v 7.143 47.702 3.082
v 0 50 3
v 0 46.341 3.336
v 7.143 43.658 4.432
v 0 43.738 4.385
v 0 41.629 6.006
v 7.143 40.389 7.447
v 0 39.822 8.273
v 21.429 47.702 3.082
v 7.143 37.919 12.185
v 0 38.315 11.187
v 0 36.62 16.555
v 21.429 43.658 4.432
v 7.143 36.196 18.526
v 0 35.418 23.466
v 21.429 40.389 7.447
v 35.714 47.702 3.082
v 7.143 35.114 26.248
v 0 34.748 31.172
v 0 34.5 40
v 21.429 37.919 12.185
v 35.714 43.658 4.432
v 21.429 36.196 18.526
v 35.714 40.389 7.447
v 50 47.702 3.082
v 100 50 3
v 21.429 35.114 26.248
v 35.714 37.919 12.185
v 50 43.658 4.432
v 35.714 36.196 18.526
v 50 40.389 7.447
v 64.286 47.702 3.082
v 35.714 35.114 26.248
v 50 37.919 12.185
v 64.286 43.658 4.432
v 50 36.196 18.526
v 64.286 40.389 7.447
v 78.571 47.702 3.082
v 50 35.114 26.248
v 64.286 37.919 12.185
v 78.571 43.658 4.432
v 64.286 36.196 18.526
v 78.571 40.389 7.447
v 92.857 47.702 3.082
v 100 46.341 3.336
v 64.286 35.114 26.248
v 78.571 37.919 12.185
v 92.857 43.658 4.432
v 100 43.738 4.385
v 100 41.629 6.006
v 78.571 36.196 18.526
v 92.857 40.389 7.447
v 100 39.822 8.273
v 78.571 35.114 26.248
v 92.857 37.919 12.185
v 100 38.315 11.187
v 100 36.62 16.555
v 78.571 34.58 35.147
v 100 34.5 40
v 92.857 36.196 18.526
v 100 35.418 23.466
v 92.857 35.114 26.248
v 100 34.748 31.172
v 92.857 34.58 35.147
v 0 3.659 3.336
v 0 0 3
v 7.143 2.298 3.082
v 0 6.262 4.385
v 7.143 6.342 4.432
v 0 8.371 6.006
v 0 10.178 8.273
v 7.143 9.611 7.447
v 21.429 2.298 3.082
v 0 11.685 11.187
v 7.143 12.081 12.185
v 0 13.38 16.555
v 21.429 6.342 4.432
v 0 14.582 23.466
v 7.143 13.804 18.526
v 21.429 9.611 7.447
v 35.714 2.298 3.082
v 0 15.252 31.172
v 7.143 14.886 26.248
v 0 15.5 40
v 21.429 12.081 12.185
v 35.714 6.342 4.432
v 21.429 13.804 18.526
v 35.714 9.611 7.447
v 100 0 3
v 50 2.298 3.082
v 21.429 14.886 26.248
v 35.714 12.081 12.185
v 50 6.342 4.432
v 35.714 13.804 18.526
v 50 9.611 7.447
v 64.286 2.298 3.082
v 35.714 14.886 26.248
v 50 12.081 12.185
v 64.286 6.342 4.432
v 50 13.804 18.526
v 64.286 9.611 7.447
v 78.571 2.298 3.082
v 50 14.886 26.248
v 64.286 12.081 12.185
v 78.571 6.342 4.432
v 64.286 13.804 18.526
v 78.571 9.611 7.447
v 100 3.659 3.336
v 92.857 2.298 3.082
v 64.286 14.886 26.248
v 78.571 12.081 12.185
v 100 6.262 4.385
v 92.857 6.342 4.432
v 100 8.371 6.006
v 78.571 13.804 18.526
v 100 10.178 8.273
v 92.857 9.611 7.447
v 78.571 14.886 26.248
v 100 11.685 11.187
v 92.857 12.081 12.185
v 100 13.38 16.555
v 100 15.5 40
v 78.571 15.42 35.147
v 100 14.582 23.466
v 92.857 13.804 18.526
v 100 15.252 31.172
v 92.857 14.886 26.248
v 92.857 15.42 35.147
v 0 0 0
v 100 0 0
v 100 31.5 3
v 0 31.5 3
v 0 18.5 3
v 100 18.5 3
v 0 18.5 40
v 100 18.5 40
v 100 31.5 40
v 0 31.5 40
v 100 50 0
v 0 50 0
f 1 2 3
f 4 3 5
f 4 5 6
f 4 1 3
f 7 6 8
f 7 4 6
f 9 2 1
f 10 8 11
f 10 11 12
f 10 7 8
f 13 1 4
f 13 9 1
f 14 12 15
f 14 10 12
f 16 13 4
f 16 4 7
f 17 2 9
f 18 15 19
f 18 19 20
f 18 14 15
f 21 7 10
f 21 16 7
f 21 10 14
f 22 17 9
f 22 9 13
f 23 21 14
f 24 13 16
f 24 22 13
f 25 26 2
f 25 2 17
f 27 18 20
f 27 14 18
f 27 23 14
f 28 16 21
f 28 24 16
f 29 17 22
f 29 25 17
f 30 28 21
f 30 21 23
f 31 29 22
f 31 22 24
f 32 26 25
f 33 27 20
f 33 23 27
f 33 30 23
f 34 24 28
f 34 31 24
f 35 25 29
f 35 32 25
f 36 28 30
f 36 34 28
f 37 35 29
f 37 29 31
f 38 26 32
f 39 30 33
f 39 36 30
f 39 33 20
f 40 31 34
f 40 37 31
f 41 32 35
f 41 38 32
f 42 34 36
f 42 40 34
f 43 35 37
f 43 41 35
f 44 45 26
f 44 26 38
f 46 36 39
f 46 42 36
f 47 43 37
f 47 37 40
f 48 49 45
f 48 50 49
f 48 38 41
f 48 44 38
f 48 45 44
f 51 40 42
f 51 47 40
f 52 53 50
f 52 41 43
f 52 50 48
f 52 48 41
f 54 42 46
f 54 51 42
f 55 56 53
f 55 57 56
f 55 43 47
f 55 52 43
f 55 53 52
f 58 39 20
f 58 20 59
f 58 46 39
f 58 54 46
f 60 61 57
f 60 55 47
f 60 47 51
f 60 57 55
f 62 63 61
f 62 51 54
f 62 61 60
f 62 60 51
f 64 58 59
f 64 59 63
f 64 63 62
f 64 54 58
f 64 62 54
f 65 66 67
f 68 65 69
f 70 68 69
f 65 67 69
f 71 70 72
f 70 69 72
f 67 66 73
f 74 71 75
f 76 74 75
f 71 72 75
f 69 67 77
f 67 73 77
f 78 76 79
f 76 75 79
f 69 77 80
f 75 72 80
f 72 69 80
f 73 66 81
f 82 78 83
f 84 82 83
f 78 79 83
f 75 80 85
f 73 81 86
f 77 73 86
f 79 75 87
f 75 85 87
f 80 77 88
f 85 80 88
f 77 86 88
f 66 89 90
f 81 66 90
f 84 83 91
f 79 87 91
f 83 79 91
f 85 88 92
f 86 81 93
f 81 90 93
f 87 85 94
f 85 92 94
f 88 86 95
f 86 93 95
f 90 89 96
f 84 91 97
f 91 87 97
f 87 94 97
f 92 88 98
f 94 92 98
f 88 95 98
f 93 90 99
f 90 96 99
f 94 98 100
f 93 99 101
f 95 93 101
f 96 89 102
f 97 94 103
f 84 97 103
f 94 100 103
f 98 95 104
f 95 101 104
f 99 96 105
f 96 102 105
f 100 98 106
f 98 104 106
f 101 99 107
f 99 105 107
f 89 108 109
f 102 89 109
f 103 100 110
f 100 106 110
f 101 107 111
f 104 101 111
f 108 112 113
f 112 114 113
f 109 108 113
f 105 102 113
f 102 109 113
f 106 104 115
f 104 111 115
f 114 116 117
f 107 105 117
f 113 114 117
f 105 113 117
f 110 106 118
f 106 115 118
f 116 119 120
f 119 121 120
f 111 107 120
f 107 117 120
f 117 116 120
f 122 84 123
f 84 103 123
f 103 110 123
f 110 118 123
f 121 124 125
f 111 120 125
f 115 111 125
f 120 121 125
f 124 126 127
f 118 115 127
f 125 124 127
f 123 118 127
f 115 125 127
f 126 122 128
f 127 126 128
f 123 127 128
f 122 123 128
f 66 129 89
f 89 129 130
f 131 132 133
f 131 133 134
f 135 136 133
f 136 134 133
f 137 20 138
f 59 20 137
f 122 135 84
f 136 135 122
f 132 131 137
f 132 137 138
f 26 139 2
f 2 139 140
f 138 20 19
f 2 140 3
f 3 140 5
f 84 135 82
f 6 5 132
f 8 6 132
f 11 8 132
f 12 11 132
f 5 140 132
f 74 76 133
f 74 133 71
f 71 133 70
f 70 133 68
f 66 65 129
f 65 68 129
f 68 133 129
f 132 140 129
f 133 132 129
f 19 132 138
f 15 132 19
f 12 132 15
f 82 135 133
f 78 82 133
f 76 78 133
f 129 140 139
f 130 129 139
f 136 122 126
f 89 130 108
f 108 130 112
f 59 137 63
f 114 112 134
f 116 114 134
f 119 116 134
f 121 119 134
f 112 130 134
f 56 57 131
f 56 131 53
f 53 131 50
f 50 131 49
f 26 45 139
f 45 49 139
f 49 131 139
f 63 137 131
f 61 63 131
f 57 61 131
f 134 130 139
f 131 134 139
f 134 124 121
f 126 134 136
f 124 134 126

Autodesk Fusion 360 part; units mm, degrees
sketch "Sketch1" plane through (0, 0, 0) normal (0, 0, 1) x (1, 0, 0)
  line L0 (0, 0) -> (100, 0)
  line L1 (100, 0) -> (100, 50)
  line L2 (100, 50) -> (0, 50)
  line L3 (0, 50) -> (0, 0)
  line L4 (0, 0) -> (100, 0)
  line L5 (100, 0) -> (100, 18.5)
  line L6 (100, 18.5) -> (0, 18.5)
  line L7 (0, 18.5) -> (0, 0)
  line L8 (0, 50) -> (100, 50)
  line L9 (100, 50) -> (100, 31.5)
  line L10 (100, 31.5) -> (0, 31.5)
  line L11 (0, 31.5) -> (0, 50)
  dimension "d1" = 100
  dimension "d2" = 50
  dimension "d3" = 18.5
  dimension "d4" = 18.5
extrude "Extrude1" add sketch "Sketch1" along normal blind 3 contours L1 L3 L6 L10
extrude "Extrude2" add sketch "Sketch1" along normal blind 40 contours L0 L1 L3 L4 L5 L6 L7 | L1 L2 L3 L8 L9 L10 L11
sketch "Sketch2" plane through (100, 0, 0) normal (1, 0, 0) x (0, 1, 0)
  line L0 (0, 0) -> (50, 0)
  line L1 (50, 0) -> (50, 40)
  line L2 (50, 40) -> (31.5, 40)
  line L3 (31.5, 40) -> (31.5, 3)
  line L4 (31.5, 3) -> (18.5, 3)
  line L5 (18.5, 3) -> (18.5, 40)
  line L6 (18.5, 40) -> (0, 40)
  line L7 (0, 40) -> (0, 0)
  line L8 (18.5, 40) -> (15.5, 40)
  line L9 (31.5, 40) -> (34.5, 40)
  spline S0 degree 5 poles (0, 3) (0.6686, 2.9687) (1.9704, 2.982) (3.8176, 3.2291) (6.0657, 4.0208) (8.4986, 5.8217) (10.5348, 8.4758) (12.1729, 11.9864) (13.442, 16.2906) (14.3808, 21.3051) (15.0282, 26.9468) (15.3373, 31.909) (15.4603, 35.8649) (15.4947, 38.6046) (15.5, 40) knots 0 0 0 0 0 0 0.1 0.2 0.3 0.4 0.5 0.6 0.7 0.8 0.9 1 1 1 1 1 1
  spline S1 degree 5 poles (50, 3) (49.3314, 2.9687) (48.0296, 2.982) (46.1824, 3.2291) (43.9343, 4.0208) (41.5014, 5.8217) (39.4652, 8.4758) (37.8271, 11.9864) (36.558, 16.2906) (35.6192, 21.3051) (34.9718, 26.9468) (34.6627, 31.909) (34.5397, 35.8649) (34.5053, 38.6046) (34.5, 40) knots 0 0 0 0 0 0 0.1 0.2 0.3 0.4 0.5 0.6 0.7 0.8 0.9 1 1 1 1 1 1
  line L10 (34.5, 40) -> (50, 40)
  line L11 (50, 3) -> (50, 40)
  line L12 (0, 3) -> (0, 40)
  line L13 (15.5, 40) -> (0, 40)
  point P0 (10, 8)
  point P1 (40, 8)
  dimension "d9" = 3
  dimension "d10" = 3
extrude "Extrude3" cut sketch "Sketch2" against normal blind 100 contours L6 L7 S0 L12 L13 | L1 L2 S1 L10 L11
